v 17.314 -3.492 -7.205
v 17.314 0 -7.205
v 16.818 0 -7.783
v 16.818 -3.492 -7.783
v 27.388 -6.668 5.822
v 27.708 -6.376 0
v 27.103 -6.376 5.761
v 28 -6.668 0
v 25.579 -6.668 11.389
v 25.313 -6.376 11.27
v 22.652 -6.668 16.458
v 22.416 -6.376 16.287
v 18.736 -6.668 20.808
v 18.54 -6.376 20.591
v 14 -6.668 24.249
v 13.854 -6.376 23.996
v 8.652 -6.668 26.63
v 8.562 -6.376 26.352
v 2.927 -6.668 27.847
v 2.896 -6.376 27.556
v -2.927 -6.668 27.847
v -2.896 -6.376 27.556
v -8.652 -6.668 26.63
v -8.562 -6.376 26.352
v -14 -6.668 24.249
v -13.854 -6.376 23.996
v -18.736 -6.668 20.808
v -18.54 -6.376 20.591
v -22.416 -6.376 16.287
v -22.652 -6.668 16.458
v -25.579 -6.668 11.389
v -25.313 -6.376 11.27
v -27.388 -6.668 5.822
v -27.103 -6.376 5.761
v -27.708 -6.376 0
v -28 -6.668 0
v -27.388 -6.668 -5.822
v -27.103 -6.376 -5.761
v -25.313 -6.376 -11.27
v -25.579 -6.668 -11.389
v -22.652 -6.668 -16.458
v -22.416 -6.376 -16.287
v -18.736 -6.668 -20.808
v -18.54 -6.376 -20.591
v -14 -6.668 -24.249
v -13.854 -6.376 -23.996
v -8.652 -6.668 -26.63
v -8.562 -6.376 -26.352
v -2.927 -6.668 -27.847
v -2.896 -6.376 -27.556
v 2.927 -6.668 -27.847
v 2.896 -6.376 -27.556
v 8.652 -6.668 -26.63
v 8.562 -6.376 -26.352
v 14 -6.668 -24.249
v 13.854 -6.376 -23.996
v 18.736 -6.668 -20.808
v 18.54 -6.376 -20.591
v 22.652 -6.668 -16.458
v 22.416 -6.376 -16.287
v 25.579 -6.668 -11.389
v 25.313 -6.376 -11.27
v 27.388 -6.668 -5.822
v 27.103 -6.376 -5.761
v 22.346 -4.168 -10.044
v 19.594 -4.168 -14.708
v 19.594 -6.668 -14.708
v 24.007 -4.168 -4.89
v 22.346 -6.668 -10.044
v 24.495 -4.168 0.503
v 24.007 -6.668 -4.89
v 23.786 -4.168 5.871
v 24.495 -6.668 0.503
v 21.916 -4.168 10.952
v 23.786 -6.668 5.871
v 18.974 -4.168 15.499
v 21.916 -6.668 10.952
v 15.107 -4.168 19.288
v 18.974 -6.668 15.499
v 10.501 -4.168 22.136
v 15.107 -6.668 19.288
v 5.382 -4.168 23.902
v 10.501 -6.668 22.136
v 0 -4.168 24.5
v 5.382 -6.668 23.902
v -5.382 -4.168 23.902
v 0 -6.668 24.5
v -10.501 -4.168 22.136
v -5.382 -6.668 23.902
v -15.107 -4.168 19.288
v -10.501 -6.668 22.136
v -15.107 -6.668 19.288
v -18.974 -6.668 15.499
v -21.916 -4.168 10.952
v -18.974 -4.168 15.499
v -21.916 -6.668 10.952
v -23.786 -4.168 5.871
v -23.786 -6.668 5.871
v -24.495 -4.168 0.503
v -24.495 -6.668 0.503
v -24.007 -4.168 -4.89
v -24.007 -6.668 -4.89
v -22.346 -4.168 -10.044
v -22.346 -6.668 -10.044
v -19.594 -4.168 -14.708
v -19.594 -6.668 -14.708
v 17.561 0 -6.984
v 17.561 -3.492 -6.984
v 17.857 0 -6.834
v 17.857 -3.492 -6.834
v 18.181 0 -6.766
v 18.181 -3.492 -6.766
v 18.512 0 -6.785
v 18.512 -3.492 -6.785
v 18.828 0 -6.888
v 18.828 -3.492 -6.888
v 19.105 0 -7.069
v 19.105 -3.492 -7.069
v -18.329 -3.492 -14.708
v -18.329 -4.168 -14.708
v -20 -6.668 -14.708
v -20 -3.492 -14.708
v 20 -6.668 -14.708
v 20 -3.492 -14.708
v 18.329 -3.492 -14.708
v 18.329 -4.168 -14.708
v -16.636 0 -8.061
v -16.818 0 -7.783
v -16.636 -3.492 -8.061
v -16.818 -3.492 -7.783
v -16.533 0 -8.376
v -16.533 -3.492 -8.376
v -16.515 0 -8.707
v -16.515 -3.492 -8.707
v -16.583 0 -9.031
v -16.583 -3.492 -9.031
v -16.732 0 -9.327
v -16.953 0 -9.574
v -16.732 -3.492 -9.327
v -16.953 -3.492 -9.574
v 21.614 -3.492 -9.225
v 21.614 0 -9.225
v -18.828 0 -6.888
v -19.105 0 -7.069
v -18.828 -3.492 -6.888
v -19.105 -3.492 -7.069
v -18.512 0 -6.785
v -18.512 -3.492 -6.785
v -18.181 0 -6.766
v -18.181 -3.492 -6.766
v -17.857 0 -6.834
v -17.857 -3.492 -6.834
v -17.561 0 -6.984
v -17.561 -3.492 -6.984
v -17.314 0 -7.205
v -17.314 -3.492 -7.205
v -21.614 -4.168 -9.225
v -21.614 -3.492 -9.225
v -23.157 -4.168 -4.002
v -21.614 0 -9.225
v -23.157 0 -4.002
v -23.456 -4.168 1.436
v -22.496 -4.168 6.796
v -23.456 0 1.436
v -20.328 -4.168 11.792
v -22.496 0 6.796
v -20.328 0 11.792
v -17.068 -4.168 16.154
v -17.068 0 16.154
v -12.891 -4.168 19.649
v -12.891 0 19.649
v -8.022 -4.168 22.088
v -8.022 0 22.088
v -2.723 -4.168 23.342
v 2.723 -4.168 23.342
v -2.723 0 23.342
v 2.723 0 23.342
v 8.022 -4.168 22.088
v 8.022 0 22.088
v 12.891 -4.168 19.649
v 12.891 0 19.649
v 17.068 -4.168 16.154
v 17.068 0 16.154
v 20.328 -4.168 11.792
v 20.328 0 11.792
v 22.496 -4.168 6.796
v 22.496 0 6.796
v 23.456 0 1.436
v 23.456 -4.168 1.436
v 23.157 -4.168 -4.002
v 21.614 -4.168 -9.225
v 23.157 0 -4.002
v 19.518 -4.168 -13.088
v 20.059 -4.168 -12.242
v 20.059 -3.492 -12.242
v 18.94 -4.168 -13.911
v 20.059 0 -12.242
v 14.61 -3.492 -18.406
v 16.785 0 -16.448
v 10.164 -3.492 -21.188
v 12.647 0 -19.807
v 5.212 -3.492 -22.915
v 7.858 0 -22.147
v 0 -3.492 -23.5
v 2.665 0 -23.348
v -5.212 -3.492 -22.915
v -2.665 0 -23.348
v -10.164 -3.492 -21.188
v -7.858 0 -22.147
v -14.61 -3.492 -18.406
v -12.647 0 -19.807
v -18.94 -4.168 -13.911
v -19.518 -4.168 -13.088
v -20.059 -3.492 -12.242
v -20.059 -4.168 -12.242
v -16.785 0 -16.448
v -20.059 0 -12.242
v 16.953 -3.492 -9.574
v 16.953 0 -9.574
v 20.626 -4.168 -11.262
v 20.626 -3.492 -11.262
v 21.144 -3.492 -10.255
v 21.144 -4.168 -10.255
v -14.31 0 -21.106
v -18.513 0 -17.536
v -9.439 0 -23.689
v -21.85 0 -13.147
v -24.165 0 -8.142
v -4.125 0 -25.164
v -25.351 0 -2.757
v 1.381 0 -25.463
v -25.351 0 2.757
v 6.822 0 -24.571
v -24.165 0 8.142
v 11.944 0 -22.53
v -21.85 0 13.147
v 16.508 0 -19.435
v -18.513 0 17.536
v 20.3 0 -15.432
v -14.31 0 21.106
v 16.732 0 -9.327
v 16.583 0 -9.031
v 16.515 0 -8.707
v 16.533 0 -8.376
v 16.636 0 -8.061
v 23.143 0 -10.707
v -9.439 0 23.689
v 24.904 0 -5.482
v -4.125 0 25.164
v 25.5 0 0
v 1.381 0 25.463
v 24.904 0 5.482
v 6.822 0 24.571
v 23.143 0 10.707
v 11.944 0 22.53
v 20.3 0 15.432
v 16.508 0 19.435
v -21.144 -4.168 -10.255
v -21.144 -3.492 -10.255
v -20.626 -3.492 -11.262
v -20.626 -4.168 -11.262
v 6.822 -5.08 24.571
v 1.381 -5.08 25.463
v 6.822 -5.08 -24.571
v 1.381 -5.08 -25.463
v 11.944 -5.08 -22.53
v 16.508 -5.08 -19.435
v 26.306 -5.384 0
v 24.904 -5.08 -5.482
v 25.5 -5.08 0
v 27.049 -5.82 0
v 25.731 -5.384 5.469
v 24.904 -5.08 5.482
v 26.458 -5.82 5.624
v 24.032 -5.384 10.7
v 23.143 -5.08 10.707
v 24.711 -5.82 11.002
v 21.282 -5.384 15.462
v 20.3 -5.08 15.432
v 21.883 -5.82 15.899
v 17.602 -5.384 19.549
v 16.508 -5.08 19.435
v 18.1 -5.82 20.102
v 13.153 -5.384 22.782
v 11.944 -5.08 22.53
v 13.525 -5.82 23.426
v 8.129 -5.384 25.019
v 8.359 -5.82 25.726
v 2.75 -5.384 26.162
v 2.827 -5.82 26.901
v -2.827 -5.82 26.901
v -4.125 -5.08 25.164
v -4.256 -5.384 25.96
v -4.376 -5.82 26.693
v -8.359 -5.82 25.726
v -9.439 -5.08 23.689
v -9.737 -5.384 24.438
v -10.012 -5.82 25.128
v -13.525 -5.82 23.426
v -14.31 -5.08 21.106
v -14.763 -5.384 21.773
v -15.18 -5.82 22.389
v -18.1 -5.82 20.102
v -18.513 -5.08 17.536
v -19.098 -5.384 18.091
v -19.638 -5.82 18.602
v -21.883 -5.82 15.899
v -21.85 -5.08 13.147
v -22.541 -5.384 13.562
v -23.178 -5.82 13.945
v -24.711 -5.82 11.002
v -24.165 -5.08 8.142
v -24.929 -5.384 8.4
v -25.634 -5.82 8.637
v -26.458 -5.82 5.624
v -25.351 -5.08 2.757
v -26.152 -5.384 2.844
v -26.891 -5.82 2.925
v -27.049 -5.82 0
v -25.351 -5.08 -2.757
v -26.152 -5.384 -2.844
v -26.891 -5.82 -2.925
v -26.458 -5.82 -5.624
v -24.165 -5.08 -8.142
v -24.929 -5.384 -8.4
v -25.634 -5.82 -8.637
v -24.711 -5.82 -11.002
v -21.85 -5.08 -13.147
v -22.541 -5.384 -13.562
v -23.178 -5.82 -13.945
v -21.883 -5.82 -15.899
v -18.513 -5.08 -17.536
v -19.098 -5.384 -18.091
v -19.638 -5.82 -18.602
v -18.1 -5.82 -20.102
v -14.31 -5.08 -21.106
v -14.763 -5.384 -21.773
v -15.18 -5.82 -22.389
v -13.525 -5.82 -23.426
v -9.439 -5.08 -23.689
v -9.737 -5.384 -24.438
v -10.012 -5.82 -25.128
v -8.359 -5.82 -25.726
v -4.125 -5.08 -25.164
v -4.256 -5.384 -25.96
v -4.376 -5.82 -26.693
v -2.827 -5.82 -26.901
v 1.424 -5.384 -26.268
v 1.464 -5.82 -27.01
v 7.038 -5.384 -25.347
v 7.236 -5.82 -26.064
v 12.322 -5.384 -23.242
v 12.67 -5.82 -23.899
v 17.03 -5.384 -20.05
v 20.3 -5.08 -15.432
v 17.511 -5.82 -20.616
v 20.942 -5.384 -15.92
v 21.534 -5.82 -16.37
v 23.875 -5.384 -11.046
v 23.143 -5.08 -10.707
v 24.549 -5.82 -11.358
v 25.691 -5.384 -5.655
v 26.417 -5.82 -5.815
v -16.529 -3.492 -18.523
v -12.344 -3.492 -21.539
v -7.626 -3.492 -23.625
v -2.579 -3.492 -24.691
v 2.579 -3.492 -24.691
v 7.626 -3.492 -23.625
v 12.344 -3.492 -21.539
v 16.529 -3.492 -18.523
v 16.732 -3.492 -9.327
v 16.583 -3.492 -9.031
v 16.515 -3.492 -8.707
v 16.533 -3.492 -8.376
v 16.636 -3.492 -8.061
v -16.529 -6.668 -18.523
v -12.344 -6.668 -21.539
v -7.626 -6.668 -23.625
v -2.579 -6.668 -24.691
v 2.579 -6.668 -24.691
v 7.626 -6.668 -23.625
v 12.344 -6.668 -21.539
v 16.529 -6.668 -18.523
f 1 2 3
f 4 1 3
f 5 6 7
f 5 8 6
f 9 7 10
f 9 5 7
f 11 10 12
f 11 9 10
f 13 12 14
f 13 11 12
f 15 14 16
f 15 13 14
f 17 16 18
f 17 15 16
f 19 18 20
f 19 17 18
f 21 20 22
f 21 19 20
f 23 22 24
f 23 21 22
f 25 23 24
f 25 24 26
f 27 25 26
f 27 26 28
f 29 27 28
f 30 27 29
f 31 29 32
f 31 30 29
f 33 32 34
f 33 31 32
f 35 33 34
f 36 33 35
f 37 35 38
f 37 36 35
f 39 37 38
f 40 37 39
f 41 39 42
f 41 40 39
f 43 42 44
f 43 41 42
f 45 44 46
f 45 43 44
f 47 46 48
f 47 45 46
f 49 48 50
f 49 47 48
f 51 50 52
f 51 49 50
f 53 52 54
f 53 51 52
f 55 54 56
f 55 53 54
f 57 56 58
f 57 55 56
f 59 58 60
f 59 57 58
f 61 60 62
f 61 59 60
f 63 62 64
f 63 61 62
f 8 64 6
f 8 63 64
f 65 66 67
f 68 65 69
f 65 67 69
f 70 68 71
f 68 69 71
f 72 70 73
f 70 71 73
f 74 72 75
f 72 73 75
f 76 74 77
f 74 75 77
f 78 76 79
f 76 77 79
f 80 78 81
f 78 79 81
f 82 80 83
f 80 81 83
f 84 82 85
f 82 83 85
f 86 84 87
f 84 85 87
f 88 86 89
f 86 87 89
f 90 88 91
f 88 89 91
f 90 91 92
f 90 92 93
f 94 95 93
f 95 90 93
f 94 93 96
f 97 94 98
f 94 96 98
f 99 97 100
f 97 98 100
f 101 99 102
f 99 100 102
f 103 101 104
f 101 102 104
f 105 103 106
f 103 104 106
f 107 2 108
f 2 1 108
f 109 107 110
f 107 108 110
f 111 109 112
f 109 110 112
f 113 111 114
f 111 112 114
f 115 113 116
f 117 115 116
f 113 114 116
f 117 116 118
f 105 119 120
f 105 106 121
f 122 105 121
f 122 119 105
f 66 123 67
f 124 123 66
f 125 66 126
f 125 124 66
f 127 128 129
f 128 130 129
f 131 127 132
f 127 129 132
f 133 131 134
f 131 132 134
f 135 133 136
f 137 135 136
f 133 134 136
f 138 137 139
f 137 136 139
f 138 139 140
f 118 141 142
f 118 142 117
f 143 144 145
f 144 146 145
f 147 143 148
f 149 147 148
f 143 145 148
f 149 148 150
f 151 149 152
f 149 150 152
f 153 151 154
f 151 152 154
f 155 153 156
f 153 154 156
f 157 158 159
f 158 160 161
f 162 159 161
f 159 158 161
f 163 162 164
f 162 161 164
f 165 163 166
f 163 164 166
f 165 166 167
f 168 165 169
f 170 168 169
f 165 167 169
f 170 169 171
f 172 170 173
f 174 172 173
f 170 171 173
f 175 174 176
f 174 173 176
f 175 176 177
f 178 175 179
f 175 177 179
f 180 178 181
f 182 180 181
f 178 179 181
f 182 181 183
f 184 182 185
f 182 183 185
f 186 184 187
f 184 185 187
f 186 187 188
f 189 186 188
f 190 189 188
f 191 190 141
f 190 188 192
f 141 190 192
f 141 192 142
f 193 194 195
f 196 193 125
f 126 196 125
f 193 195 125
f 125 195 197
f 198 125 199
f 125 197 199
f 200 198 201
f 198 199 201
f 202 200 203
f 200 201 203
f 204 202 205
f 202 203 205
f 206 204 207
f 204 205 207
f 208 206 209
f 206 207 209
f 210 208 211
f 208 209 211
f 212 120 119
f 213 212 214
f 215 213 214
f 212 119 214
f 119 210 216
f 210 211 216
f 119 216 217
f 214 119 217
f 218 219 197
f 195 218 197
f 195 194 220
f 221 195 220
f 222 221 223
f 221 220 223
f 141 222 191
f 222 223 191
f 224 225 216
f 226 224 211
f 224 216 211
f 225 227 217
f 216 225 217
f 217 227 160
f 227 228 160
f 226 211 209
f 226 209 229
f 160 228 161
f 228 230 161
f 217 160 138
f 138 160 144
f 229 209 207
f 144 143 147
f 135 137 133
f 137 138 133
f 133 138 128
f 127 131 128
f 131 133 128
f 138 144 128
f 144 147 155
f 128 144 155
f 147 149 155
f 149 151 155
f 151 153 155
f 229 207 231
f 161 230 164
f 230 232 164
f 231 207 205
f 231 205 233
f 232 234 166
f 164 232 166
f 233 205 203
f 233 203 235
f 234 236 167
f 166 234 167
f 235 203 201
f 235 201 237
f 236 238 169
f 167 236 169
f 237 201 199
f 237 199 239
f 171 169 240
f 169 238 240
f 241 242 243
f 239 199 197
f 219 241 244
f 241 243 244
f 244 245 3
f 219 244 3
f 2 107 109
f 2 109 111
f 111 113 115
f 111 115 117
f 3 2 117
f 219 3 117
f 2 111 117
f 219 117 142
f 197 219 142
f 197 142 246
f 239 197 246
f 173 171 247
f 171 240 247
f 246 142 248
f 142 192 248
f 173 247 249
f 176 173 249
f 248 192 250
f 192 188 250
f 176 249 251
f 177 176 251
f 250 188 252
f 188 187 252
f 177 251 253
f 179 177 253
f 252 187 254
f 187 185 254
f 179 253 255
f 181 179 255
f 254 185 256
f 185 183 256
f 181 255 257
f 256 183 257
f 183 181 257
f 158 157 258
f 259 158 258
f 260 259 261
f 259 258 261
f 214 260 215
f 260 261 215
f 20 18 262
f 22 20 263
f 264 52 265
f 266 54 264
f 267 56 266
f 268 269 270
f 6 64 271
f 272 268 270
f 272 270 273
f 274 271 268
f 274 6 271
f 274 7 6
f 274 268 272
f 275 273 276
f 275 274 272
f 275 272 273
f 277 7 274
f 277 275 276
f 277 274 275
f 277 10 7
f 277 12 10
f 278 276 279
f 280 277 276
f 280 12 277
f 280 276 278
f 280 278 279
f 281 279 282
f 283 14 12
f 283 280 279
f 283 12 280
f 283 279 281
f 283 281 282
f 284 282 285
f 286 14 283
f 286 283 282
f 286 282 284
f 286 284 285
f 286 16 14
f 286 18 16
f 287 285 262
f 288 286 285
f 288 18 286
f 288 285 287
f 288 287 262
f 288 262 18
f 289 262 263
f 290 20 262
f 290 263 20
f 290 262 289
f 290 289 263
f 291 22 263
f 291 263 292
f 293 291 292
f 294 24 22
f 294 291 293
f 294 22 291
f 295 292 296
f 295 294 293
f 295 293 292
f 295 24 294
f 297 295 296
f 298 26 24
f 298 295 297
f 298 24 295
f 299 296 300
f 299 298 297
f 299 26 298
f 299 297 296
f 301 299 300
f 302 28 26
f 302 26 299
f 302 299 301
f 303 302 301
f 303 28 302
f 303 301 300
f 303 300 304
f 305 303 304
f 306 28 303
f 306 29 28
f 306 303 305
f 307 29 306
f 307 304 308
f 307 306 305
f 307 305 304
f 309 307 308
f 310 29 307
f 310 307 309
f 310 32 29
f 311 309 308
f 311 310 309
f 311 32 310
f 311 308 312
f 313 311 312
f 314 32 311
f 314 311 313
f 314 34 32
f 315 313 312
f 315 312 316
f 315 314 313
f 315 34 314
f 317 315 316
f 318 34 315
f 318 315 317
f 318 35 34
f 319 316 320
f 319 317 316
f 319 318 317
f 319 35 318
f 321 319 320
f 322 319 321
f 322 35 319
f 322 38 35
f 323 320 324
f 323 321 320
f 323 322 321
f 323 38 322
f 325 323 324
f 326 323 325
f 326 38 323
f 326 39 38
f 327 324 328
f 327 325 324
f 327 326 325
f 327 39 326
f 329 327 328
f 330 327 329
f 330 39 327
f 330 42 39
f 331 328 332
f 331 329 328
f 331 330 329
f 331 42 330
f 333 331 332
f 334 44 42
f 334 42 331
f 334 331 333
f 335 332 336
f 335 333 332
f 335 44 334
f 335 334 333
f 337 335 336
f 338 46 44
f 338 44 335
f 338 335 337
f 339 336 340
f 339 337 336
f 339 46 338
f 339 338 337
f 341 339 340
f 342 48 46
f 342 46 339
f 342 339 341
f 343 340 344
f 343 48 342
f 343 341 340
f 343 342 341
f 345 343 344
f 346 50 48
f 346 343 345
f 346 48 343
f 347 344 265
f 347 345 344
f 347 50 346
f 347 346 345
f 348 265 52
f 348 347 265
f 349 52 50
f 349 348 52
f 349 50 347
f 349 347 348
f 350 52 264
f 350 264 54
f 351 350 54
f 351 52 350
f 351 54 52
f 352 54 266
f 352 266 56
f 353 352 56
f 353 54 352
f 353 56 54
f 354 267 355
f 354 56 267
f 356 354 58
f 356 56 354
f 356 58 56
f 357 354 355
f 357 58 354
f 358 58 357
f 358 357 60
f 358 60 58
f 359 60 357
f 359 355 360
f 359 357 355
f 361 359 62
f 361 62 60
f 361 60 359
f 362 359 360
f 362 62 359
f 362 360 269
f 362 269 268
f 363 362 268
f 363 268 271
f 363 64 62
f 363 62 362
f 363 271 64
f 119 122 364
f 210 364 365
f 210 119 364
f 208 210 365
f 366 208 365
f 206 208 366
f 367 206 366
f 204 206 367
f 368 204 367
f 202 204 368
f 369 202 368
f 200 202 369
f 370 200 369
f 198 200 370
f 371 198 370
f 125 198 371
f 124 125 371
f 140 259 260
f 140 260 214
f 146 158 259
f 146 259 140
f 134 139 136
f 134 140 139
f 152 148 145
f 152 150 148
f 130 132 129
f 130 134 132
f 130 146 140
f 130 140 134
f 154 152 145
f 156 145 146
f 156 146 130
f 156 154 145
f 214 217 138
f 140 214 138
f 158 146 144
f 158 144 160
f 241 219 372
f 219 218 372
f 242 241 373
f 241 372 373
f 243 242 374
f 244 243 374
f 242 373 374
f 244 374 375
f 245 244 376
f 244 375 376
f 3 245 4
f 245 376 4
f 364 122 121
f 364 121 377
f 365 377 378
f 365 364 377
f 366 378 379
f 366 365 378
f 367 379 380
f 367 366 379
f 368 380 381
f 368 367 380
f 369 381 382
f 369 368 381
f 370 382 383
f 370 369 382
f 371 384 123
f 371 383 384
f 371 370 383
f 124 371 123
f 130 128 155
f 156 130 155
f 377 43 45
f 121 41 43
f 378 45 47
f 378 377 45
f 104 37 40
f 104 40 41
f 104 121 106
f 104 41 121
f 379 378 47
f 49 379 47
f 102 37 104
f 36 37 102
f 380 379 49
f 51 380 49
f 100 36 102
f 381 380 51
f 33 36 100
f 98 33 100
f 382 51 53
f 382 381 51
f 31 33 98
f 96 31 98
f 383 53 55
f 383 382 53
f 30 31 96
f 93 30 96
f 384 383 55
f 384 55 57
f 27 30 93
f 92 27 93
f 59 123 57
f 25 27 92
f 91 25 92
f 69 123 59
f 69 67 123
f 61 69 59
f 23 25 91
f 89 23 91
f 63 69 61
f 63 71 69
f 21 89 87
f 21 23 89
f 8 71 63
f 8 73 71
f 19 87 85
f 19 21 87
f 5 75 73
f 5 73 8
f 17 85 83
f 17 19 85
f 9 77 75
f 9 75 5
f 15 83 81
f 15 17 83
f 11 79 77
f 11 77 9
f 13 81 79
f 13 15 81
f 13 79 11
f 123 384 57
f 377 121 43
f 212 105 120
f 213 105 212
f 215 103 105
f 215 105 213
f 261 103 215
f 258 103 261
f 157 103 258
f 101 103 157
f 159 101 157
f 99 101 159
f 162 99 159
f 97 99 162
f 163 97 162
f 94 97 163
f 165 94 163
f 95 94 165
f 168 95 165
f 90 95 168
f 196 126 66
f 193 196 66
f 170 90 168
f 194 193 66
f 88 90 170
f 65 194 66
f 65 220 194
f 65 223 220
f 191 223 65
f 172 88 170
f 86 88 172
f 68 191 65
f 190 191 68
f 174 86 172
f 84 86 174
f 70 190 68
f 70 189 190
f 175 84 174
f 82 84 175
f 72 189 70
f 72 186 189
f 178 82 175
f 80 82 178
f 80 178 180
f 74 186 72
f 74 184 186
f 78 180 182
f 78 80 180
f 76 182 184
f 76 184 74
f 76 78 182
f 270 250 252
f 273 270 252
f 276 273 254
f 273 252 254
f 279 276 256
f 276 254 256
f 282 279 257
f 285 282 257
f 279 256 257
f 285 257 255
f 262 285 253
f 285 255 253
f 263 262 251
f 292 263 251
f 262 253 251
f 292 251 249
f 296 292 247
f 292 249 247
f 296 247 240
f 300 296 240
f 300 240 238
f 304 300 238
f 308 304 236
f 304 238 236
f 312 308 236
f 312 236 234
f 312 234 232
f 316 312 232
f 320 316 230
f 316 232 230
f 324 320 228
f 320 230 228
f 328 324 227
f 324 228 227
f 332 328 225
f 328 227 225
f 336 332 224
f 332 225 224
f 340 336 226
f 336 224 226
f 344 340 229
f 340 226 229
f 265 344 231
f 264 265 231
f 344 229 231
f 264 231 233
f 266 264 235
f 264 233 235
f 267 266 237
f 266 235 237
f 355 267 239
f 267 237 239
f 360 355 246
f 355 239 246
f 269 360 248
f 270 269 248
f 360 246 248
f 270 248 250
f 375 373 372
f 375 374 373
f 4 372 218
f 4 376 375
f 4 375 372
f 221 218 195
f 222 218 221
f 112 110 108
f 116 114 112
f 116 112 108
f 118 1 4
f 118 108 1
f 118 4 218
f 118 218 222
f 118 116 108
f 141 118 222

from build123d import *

# Parameters (mm, degrees)
F0_R          = 25.5
F1_DEPTH      = 5.08
F3_R          = 28
F3_R_2        = 23.5
F4_DEPTH      = 1.5875
F5_DEPTH      = 1.5875
F5_DEPTH_BACK = 3.175
F6_DEPTH      = 1.5875
F9_R          = 24.5
F10_DEPTH     = 2.5
F11_R         = 1.27


# Not quite as in the source:
# - a fillet or chamfer that OpenCascade refuses, or shapes differently, is made with other operations: its cross-section is extruded or revolved along the edge and cut away or added


with BuildPart() as f1:
    # F0 (on Front) → F1 (new body)
    with BuildSketch(Plane.XZ):
        Circle(F0_R)
        with BuildLine():
            ThreePointArc((20.0593759089, -12.2421990731), (0, -23.5), (-20.0593759089, -12.2421990731))
            Line((-20.0593759089, -12.2421990731), (-15.990073811, -8.7466746798))
            Line((-15.990073811, -8.7466746798), (-18.1416651056, -6.2419074449))
            Line((-18.1416651056, -6.2419074449), (-21.61384866, -9.2245079057))
            ThreePointArc((-21.61384866, -9.2245079057), (0, 23.5), (21.61384866, -9.2245079057))
            Line((21.61384866, -9.2245079057), (18.1416651056, -6.2419074449))
            Line((18.1416651056, -6.2419074449), (15.990073811, -8.7466746798))
            Line((15.990073811, -8.7466746798), (20.0593759089, -12.2421990731))
        make_face(mode=Mode.SUBTRACT)
    extrude(amount=F1_DEPTH)

    # F3 (on face) → F4 (join)
    with BuildSketch(Plane.XZ.offset(5.08)):
        Circle(F3_R)
        Circle(F3_R_2, mode=Mode.SUBTRACT)
    extrude(amount=F4_DEPTH)

    # F2 (on face) → F5 (cut, two sides)
    with BuildSketch(Plane.XZ.offset(5.08)) as f5_sk:
        with BuildLine():
            Line((20, -14.7076810144), (-20, -14.7076810144))
            ThreePointArc((-20, -14.7076810144), (0, -24.8257100769), (20, -14.7076810144))
        make_face()
    extrude(amount=-F5_DEPTH, mode=Mode.SUBTRACT)
    extrude(f5_sk.sketch, amount=F5_DEPTH_BACK, mode=Mode.SUBTRACT)

    # F6 (cut): faces of the model
    f6_faces = [f1.faces().sort_by_distance(p)[0] for p in [
        (18.9429993018, -5.08, -9.163640961),
        (-18.9429993018, -5.08, -9.163640961),
    ]]
    extrude(f6_faces, amount=-F6_DEPTH, mode=Mode.SUBTRACT)

    # F7: chamfer of 1.5875 on 1 edges, made by hand

    # F7_s1 → F7_t2 (revolve, cut)
    with BuildSketch(Plane.XY):
        Polygon((26.4125, -5.08), (28, -6.6675), (28, -5.08), align=None)
    revolve(axis=Axis((0, -5.08, 0), (0, -1, 0)), mode=Mode.SUBTRACT)

    # F8: fillet of radius 5.08 on 1 edges, made by hand

    # F8_s1 → F8_t2 (revolve, cut)
    with BuildSketch(Plane.XY):
        with BuildLine():
            ThreePointArc((25.5, -5.08), (26.6871185711, -5.586485263), (27.7082857935, -6.3757857935))
            Line((27.7082857935, -6.3757857935), (26.4125, -5.08))
            Line((26.4125, -5.08), (25.5, -5.08))
        make_face()
    revolve(axis=Axis((0, -5.08, 0), (0, -1, 0)), mode=Mode.SUBTRACT)

    # F9 (on face) → F10 (cut)
    with BuildSketch(Plane.XZ.offset(6.6675)):
        Circle(F9_R)
    extrude(amount=-F10_DEPTH, mode=Mode.SUBTRACT)

    # F11
    f11_edges = [f1.edges().sort_by_distance(p)[0] for p in [
        (-15.990074, -1.74625, -8.746675),
        (-18.141665, -1.74625, -6.241907),
        (15.990074, -1.74625, -8.746675),
        (18.141665, -1.74625, -6.241907),
    ]]
    fillet(f11_edges, radius=F11_R)


solid = f1.part
